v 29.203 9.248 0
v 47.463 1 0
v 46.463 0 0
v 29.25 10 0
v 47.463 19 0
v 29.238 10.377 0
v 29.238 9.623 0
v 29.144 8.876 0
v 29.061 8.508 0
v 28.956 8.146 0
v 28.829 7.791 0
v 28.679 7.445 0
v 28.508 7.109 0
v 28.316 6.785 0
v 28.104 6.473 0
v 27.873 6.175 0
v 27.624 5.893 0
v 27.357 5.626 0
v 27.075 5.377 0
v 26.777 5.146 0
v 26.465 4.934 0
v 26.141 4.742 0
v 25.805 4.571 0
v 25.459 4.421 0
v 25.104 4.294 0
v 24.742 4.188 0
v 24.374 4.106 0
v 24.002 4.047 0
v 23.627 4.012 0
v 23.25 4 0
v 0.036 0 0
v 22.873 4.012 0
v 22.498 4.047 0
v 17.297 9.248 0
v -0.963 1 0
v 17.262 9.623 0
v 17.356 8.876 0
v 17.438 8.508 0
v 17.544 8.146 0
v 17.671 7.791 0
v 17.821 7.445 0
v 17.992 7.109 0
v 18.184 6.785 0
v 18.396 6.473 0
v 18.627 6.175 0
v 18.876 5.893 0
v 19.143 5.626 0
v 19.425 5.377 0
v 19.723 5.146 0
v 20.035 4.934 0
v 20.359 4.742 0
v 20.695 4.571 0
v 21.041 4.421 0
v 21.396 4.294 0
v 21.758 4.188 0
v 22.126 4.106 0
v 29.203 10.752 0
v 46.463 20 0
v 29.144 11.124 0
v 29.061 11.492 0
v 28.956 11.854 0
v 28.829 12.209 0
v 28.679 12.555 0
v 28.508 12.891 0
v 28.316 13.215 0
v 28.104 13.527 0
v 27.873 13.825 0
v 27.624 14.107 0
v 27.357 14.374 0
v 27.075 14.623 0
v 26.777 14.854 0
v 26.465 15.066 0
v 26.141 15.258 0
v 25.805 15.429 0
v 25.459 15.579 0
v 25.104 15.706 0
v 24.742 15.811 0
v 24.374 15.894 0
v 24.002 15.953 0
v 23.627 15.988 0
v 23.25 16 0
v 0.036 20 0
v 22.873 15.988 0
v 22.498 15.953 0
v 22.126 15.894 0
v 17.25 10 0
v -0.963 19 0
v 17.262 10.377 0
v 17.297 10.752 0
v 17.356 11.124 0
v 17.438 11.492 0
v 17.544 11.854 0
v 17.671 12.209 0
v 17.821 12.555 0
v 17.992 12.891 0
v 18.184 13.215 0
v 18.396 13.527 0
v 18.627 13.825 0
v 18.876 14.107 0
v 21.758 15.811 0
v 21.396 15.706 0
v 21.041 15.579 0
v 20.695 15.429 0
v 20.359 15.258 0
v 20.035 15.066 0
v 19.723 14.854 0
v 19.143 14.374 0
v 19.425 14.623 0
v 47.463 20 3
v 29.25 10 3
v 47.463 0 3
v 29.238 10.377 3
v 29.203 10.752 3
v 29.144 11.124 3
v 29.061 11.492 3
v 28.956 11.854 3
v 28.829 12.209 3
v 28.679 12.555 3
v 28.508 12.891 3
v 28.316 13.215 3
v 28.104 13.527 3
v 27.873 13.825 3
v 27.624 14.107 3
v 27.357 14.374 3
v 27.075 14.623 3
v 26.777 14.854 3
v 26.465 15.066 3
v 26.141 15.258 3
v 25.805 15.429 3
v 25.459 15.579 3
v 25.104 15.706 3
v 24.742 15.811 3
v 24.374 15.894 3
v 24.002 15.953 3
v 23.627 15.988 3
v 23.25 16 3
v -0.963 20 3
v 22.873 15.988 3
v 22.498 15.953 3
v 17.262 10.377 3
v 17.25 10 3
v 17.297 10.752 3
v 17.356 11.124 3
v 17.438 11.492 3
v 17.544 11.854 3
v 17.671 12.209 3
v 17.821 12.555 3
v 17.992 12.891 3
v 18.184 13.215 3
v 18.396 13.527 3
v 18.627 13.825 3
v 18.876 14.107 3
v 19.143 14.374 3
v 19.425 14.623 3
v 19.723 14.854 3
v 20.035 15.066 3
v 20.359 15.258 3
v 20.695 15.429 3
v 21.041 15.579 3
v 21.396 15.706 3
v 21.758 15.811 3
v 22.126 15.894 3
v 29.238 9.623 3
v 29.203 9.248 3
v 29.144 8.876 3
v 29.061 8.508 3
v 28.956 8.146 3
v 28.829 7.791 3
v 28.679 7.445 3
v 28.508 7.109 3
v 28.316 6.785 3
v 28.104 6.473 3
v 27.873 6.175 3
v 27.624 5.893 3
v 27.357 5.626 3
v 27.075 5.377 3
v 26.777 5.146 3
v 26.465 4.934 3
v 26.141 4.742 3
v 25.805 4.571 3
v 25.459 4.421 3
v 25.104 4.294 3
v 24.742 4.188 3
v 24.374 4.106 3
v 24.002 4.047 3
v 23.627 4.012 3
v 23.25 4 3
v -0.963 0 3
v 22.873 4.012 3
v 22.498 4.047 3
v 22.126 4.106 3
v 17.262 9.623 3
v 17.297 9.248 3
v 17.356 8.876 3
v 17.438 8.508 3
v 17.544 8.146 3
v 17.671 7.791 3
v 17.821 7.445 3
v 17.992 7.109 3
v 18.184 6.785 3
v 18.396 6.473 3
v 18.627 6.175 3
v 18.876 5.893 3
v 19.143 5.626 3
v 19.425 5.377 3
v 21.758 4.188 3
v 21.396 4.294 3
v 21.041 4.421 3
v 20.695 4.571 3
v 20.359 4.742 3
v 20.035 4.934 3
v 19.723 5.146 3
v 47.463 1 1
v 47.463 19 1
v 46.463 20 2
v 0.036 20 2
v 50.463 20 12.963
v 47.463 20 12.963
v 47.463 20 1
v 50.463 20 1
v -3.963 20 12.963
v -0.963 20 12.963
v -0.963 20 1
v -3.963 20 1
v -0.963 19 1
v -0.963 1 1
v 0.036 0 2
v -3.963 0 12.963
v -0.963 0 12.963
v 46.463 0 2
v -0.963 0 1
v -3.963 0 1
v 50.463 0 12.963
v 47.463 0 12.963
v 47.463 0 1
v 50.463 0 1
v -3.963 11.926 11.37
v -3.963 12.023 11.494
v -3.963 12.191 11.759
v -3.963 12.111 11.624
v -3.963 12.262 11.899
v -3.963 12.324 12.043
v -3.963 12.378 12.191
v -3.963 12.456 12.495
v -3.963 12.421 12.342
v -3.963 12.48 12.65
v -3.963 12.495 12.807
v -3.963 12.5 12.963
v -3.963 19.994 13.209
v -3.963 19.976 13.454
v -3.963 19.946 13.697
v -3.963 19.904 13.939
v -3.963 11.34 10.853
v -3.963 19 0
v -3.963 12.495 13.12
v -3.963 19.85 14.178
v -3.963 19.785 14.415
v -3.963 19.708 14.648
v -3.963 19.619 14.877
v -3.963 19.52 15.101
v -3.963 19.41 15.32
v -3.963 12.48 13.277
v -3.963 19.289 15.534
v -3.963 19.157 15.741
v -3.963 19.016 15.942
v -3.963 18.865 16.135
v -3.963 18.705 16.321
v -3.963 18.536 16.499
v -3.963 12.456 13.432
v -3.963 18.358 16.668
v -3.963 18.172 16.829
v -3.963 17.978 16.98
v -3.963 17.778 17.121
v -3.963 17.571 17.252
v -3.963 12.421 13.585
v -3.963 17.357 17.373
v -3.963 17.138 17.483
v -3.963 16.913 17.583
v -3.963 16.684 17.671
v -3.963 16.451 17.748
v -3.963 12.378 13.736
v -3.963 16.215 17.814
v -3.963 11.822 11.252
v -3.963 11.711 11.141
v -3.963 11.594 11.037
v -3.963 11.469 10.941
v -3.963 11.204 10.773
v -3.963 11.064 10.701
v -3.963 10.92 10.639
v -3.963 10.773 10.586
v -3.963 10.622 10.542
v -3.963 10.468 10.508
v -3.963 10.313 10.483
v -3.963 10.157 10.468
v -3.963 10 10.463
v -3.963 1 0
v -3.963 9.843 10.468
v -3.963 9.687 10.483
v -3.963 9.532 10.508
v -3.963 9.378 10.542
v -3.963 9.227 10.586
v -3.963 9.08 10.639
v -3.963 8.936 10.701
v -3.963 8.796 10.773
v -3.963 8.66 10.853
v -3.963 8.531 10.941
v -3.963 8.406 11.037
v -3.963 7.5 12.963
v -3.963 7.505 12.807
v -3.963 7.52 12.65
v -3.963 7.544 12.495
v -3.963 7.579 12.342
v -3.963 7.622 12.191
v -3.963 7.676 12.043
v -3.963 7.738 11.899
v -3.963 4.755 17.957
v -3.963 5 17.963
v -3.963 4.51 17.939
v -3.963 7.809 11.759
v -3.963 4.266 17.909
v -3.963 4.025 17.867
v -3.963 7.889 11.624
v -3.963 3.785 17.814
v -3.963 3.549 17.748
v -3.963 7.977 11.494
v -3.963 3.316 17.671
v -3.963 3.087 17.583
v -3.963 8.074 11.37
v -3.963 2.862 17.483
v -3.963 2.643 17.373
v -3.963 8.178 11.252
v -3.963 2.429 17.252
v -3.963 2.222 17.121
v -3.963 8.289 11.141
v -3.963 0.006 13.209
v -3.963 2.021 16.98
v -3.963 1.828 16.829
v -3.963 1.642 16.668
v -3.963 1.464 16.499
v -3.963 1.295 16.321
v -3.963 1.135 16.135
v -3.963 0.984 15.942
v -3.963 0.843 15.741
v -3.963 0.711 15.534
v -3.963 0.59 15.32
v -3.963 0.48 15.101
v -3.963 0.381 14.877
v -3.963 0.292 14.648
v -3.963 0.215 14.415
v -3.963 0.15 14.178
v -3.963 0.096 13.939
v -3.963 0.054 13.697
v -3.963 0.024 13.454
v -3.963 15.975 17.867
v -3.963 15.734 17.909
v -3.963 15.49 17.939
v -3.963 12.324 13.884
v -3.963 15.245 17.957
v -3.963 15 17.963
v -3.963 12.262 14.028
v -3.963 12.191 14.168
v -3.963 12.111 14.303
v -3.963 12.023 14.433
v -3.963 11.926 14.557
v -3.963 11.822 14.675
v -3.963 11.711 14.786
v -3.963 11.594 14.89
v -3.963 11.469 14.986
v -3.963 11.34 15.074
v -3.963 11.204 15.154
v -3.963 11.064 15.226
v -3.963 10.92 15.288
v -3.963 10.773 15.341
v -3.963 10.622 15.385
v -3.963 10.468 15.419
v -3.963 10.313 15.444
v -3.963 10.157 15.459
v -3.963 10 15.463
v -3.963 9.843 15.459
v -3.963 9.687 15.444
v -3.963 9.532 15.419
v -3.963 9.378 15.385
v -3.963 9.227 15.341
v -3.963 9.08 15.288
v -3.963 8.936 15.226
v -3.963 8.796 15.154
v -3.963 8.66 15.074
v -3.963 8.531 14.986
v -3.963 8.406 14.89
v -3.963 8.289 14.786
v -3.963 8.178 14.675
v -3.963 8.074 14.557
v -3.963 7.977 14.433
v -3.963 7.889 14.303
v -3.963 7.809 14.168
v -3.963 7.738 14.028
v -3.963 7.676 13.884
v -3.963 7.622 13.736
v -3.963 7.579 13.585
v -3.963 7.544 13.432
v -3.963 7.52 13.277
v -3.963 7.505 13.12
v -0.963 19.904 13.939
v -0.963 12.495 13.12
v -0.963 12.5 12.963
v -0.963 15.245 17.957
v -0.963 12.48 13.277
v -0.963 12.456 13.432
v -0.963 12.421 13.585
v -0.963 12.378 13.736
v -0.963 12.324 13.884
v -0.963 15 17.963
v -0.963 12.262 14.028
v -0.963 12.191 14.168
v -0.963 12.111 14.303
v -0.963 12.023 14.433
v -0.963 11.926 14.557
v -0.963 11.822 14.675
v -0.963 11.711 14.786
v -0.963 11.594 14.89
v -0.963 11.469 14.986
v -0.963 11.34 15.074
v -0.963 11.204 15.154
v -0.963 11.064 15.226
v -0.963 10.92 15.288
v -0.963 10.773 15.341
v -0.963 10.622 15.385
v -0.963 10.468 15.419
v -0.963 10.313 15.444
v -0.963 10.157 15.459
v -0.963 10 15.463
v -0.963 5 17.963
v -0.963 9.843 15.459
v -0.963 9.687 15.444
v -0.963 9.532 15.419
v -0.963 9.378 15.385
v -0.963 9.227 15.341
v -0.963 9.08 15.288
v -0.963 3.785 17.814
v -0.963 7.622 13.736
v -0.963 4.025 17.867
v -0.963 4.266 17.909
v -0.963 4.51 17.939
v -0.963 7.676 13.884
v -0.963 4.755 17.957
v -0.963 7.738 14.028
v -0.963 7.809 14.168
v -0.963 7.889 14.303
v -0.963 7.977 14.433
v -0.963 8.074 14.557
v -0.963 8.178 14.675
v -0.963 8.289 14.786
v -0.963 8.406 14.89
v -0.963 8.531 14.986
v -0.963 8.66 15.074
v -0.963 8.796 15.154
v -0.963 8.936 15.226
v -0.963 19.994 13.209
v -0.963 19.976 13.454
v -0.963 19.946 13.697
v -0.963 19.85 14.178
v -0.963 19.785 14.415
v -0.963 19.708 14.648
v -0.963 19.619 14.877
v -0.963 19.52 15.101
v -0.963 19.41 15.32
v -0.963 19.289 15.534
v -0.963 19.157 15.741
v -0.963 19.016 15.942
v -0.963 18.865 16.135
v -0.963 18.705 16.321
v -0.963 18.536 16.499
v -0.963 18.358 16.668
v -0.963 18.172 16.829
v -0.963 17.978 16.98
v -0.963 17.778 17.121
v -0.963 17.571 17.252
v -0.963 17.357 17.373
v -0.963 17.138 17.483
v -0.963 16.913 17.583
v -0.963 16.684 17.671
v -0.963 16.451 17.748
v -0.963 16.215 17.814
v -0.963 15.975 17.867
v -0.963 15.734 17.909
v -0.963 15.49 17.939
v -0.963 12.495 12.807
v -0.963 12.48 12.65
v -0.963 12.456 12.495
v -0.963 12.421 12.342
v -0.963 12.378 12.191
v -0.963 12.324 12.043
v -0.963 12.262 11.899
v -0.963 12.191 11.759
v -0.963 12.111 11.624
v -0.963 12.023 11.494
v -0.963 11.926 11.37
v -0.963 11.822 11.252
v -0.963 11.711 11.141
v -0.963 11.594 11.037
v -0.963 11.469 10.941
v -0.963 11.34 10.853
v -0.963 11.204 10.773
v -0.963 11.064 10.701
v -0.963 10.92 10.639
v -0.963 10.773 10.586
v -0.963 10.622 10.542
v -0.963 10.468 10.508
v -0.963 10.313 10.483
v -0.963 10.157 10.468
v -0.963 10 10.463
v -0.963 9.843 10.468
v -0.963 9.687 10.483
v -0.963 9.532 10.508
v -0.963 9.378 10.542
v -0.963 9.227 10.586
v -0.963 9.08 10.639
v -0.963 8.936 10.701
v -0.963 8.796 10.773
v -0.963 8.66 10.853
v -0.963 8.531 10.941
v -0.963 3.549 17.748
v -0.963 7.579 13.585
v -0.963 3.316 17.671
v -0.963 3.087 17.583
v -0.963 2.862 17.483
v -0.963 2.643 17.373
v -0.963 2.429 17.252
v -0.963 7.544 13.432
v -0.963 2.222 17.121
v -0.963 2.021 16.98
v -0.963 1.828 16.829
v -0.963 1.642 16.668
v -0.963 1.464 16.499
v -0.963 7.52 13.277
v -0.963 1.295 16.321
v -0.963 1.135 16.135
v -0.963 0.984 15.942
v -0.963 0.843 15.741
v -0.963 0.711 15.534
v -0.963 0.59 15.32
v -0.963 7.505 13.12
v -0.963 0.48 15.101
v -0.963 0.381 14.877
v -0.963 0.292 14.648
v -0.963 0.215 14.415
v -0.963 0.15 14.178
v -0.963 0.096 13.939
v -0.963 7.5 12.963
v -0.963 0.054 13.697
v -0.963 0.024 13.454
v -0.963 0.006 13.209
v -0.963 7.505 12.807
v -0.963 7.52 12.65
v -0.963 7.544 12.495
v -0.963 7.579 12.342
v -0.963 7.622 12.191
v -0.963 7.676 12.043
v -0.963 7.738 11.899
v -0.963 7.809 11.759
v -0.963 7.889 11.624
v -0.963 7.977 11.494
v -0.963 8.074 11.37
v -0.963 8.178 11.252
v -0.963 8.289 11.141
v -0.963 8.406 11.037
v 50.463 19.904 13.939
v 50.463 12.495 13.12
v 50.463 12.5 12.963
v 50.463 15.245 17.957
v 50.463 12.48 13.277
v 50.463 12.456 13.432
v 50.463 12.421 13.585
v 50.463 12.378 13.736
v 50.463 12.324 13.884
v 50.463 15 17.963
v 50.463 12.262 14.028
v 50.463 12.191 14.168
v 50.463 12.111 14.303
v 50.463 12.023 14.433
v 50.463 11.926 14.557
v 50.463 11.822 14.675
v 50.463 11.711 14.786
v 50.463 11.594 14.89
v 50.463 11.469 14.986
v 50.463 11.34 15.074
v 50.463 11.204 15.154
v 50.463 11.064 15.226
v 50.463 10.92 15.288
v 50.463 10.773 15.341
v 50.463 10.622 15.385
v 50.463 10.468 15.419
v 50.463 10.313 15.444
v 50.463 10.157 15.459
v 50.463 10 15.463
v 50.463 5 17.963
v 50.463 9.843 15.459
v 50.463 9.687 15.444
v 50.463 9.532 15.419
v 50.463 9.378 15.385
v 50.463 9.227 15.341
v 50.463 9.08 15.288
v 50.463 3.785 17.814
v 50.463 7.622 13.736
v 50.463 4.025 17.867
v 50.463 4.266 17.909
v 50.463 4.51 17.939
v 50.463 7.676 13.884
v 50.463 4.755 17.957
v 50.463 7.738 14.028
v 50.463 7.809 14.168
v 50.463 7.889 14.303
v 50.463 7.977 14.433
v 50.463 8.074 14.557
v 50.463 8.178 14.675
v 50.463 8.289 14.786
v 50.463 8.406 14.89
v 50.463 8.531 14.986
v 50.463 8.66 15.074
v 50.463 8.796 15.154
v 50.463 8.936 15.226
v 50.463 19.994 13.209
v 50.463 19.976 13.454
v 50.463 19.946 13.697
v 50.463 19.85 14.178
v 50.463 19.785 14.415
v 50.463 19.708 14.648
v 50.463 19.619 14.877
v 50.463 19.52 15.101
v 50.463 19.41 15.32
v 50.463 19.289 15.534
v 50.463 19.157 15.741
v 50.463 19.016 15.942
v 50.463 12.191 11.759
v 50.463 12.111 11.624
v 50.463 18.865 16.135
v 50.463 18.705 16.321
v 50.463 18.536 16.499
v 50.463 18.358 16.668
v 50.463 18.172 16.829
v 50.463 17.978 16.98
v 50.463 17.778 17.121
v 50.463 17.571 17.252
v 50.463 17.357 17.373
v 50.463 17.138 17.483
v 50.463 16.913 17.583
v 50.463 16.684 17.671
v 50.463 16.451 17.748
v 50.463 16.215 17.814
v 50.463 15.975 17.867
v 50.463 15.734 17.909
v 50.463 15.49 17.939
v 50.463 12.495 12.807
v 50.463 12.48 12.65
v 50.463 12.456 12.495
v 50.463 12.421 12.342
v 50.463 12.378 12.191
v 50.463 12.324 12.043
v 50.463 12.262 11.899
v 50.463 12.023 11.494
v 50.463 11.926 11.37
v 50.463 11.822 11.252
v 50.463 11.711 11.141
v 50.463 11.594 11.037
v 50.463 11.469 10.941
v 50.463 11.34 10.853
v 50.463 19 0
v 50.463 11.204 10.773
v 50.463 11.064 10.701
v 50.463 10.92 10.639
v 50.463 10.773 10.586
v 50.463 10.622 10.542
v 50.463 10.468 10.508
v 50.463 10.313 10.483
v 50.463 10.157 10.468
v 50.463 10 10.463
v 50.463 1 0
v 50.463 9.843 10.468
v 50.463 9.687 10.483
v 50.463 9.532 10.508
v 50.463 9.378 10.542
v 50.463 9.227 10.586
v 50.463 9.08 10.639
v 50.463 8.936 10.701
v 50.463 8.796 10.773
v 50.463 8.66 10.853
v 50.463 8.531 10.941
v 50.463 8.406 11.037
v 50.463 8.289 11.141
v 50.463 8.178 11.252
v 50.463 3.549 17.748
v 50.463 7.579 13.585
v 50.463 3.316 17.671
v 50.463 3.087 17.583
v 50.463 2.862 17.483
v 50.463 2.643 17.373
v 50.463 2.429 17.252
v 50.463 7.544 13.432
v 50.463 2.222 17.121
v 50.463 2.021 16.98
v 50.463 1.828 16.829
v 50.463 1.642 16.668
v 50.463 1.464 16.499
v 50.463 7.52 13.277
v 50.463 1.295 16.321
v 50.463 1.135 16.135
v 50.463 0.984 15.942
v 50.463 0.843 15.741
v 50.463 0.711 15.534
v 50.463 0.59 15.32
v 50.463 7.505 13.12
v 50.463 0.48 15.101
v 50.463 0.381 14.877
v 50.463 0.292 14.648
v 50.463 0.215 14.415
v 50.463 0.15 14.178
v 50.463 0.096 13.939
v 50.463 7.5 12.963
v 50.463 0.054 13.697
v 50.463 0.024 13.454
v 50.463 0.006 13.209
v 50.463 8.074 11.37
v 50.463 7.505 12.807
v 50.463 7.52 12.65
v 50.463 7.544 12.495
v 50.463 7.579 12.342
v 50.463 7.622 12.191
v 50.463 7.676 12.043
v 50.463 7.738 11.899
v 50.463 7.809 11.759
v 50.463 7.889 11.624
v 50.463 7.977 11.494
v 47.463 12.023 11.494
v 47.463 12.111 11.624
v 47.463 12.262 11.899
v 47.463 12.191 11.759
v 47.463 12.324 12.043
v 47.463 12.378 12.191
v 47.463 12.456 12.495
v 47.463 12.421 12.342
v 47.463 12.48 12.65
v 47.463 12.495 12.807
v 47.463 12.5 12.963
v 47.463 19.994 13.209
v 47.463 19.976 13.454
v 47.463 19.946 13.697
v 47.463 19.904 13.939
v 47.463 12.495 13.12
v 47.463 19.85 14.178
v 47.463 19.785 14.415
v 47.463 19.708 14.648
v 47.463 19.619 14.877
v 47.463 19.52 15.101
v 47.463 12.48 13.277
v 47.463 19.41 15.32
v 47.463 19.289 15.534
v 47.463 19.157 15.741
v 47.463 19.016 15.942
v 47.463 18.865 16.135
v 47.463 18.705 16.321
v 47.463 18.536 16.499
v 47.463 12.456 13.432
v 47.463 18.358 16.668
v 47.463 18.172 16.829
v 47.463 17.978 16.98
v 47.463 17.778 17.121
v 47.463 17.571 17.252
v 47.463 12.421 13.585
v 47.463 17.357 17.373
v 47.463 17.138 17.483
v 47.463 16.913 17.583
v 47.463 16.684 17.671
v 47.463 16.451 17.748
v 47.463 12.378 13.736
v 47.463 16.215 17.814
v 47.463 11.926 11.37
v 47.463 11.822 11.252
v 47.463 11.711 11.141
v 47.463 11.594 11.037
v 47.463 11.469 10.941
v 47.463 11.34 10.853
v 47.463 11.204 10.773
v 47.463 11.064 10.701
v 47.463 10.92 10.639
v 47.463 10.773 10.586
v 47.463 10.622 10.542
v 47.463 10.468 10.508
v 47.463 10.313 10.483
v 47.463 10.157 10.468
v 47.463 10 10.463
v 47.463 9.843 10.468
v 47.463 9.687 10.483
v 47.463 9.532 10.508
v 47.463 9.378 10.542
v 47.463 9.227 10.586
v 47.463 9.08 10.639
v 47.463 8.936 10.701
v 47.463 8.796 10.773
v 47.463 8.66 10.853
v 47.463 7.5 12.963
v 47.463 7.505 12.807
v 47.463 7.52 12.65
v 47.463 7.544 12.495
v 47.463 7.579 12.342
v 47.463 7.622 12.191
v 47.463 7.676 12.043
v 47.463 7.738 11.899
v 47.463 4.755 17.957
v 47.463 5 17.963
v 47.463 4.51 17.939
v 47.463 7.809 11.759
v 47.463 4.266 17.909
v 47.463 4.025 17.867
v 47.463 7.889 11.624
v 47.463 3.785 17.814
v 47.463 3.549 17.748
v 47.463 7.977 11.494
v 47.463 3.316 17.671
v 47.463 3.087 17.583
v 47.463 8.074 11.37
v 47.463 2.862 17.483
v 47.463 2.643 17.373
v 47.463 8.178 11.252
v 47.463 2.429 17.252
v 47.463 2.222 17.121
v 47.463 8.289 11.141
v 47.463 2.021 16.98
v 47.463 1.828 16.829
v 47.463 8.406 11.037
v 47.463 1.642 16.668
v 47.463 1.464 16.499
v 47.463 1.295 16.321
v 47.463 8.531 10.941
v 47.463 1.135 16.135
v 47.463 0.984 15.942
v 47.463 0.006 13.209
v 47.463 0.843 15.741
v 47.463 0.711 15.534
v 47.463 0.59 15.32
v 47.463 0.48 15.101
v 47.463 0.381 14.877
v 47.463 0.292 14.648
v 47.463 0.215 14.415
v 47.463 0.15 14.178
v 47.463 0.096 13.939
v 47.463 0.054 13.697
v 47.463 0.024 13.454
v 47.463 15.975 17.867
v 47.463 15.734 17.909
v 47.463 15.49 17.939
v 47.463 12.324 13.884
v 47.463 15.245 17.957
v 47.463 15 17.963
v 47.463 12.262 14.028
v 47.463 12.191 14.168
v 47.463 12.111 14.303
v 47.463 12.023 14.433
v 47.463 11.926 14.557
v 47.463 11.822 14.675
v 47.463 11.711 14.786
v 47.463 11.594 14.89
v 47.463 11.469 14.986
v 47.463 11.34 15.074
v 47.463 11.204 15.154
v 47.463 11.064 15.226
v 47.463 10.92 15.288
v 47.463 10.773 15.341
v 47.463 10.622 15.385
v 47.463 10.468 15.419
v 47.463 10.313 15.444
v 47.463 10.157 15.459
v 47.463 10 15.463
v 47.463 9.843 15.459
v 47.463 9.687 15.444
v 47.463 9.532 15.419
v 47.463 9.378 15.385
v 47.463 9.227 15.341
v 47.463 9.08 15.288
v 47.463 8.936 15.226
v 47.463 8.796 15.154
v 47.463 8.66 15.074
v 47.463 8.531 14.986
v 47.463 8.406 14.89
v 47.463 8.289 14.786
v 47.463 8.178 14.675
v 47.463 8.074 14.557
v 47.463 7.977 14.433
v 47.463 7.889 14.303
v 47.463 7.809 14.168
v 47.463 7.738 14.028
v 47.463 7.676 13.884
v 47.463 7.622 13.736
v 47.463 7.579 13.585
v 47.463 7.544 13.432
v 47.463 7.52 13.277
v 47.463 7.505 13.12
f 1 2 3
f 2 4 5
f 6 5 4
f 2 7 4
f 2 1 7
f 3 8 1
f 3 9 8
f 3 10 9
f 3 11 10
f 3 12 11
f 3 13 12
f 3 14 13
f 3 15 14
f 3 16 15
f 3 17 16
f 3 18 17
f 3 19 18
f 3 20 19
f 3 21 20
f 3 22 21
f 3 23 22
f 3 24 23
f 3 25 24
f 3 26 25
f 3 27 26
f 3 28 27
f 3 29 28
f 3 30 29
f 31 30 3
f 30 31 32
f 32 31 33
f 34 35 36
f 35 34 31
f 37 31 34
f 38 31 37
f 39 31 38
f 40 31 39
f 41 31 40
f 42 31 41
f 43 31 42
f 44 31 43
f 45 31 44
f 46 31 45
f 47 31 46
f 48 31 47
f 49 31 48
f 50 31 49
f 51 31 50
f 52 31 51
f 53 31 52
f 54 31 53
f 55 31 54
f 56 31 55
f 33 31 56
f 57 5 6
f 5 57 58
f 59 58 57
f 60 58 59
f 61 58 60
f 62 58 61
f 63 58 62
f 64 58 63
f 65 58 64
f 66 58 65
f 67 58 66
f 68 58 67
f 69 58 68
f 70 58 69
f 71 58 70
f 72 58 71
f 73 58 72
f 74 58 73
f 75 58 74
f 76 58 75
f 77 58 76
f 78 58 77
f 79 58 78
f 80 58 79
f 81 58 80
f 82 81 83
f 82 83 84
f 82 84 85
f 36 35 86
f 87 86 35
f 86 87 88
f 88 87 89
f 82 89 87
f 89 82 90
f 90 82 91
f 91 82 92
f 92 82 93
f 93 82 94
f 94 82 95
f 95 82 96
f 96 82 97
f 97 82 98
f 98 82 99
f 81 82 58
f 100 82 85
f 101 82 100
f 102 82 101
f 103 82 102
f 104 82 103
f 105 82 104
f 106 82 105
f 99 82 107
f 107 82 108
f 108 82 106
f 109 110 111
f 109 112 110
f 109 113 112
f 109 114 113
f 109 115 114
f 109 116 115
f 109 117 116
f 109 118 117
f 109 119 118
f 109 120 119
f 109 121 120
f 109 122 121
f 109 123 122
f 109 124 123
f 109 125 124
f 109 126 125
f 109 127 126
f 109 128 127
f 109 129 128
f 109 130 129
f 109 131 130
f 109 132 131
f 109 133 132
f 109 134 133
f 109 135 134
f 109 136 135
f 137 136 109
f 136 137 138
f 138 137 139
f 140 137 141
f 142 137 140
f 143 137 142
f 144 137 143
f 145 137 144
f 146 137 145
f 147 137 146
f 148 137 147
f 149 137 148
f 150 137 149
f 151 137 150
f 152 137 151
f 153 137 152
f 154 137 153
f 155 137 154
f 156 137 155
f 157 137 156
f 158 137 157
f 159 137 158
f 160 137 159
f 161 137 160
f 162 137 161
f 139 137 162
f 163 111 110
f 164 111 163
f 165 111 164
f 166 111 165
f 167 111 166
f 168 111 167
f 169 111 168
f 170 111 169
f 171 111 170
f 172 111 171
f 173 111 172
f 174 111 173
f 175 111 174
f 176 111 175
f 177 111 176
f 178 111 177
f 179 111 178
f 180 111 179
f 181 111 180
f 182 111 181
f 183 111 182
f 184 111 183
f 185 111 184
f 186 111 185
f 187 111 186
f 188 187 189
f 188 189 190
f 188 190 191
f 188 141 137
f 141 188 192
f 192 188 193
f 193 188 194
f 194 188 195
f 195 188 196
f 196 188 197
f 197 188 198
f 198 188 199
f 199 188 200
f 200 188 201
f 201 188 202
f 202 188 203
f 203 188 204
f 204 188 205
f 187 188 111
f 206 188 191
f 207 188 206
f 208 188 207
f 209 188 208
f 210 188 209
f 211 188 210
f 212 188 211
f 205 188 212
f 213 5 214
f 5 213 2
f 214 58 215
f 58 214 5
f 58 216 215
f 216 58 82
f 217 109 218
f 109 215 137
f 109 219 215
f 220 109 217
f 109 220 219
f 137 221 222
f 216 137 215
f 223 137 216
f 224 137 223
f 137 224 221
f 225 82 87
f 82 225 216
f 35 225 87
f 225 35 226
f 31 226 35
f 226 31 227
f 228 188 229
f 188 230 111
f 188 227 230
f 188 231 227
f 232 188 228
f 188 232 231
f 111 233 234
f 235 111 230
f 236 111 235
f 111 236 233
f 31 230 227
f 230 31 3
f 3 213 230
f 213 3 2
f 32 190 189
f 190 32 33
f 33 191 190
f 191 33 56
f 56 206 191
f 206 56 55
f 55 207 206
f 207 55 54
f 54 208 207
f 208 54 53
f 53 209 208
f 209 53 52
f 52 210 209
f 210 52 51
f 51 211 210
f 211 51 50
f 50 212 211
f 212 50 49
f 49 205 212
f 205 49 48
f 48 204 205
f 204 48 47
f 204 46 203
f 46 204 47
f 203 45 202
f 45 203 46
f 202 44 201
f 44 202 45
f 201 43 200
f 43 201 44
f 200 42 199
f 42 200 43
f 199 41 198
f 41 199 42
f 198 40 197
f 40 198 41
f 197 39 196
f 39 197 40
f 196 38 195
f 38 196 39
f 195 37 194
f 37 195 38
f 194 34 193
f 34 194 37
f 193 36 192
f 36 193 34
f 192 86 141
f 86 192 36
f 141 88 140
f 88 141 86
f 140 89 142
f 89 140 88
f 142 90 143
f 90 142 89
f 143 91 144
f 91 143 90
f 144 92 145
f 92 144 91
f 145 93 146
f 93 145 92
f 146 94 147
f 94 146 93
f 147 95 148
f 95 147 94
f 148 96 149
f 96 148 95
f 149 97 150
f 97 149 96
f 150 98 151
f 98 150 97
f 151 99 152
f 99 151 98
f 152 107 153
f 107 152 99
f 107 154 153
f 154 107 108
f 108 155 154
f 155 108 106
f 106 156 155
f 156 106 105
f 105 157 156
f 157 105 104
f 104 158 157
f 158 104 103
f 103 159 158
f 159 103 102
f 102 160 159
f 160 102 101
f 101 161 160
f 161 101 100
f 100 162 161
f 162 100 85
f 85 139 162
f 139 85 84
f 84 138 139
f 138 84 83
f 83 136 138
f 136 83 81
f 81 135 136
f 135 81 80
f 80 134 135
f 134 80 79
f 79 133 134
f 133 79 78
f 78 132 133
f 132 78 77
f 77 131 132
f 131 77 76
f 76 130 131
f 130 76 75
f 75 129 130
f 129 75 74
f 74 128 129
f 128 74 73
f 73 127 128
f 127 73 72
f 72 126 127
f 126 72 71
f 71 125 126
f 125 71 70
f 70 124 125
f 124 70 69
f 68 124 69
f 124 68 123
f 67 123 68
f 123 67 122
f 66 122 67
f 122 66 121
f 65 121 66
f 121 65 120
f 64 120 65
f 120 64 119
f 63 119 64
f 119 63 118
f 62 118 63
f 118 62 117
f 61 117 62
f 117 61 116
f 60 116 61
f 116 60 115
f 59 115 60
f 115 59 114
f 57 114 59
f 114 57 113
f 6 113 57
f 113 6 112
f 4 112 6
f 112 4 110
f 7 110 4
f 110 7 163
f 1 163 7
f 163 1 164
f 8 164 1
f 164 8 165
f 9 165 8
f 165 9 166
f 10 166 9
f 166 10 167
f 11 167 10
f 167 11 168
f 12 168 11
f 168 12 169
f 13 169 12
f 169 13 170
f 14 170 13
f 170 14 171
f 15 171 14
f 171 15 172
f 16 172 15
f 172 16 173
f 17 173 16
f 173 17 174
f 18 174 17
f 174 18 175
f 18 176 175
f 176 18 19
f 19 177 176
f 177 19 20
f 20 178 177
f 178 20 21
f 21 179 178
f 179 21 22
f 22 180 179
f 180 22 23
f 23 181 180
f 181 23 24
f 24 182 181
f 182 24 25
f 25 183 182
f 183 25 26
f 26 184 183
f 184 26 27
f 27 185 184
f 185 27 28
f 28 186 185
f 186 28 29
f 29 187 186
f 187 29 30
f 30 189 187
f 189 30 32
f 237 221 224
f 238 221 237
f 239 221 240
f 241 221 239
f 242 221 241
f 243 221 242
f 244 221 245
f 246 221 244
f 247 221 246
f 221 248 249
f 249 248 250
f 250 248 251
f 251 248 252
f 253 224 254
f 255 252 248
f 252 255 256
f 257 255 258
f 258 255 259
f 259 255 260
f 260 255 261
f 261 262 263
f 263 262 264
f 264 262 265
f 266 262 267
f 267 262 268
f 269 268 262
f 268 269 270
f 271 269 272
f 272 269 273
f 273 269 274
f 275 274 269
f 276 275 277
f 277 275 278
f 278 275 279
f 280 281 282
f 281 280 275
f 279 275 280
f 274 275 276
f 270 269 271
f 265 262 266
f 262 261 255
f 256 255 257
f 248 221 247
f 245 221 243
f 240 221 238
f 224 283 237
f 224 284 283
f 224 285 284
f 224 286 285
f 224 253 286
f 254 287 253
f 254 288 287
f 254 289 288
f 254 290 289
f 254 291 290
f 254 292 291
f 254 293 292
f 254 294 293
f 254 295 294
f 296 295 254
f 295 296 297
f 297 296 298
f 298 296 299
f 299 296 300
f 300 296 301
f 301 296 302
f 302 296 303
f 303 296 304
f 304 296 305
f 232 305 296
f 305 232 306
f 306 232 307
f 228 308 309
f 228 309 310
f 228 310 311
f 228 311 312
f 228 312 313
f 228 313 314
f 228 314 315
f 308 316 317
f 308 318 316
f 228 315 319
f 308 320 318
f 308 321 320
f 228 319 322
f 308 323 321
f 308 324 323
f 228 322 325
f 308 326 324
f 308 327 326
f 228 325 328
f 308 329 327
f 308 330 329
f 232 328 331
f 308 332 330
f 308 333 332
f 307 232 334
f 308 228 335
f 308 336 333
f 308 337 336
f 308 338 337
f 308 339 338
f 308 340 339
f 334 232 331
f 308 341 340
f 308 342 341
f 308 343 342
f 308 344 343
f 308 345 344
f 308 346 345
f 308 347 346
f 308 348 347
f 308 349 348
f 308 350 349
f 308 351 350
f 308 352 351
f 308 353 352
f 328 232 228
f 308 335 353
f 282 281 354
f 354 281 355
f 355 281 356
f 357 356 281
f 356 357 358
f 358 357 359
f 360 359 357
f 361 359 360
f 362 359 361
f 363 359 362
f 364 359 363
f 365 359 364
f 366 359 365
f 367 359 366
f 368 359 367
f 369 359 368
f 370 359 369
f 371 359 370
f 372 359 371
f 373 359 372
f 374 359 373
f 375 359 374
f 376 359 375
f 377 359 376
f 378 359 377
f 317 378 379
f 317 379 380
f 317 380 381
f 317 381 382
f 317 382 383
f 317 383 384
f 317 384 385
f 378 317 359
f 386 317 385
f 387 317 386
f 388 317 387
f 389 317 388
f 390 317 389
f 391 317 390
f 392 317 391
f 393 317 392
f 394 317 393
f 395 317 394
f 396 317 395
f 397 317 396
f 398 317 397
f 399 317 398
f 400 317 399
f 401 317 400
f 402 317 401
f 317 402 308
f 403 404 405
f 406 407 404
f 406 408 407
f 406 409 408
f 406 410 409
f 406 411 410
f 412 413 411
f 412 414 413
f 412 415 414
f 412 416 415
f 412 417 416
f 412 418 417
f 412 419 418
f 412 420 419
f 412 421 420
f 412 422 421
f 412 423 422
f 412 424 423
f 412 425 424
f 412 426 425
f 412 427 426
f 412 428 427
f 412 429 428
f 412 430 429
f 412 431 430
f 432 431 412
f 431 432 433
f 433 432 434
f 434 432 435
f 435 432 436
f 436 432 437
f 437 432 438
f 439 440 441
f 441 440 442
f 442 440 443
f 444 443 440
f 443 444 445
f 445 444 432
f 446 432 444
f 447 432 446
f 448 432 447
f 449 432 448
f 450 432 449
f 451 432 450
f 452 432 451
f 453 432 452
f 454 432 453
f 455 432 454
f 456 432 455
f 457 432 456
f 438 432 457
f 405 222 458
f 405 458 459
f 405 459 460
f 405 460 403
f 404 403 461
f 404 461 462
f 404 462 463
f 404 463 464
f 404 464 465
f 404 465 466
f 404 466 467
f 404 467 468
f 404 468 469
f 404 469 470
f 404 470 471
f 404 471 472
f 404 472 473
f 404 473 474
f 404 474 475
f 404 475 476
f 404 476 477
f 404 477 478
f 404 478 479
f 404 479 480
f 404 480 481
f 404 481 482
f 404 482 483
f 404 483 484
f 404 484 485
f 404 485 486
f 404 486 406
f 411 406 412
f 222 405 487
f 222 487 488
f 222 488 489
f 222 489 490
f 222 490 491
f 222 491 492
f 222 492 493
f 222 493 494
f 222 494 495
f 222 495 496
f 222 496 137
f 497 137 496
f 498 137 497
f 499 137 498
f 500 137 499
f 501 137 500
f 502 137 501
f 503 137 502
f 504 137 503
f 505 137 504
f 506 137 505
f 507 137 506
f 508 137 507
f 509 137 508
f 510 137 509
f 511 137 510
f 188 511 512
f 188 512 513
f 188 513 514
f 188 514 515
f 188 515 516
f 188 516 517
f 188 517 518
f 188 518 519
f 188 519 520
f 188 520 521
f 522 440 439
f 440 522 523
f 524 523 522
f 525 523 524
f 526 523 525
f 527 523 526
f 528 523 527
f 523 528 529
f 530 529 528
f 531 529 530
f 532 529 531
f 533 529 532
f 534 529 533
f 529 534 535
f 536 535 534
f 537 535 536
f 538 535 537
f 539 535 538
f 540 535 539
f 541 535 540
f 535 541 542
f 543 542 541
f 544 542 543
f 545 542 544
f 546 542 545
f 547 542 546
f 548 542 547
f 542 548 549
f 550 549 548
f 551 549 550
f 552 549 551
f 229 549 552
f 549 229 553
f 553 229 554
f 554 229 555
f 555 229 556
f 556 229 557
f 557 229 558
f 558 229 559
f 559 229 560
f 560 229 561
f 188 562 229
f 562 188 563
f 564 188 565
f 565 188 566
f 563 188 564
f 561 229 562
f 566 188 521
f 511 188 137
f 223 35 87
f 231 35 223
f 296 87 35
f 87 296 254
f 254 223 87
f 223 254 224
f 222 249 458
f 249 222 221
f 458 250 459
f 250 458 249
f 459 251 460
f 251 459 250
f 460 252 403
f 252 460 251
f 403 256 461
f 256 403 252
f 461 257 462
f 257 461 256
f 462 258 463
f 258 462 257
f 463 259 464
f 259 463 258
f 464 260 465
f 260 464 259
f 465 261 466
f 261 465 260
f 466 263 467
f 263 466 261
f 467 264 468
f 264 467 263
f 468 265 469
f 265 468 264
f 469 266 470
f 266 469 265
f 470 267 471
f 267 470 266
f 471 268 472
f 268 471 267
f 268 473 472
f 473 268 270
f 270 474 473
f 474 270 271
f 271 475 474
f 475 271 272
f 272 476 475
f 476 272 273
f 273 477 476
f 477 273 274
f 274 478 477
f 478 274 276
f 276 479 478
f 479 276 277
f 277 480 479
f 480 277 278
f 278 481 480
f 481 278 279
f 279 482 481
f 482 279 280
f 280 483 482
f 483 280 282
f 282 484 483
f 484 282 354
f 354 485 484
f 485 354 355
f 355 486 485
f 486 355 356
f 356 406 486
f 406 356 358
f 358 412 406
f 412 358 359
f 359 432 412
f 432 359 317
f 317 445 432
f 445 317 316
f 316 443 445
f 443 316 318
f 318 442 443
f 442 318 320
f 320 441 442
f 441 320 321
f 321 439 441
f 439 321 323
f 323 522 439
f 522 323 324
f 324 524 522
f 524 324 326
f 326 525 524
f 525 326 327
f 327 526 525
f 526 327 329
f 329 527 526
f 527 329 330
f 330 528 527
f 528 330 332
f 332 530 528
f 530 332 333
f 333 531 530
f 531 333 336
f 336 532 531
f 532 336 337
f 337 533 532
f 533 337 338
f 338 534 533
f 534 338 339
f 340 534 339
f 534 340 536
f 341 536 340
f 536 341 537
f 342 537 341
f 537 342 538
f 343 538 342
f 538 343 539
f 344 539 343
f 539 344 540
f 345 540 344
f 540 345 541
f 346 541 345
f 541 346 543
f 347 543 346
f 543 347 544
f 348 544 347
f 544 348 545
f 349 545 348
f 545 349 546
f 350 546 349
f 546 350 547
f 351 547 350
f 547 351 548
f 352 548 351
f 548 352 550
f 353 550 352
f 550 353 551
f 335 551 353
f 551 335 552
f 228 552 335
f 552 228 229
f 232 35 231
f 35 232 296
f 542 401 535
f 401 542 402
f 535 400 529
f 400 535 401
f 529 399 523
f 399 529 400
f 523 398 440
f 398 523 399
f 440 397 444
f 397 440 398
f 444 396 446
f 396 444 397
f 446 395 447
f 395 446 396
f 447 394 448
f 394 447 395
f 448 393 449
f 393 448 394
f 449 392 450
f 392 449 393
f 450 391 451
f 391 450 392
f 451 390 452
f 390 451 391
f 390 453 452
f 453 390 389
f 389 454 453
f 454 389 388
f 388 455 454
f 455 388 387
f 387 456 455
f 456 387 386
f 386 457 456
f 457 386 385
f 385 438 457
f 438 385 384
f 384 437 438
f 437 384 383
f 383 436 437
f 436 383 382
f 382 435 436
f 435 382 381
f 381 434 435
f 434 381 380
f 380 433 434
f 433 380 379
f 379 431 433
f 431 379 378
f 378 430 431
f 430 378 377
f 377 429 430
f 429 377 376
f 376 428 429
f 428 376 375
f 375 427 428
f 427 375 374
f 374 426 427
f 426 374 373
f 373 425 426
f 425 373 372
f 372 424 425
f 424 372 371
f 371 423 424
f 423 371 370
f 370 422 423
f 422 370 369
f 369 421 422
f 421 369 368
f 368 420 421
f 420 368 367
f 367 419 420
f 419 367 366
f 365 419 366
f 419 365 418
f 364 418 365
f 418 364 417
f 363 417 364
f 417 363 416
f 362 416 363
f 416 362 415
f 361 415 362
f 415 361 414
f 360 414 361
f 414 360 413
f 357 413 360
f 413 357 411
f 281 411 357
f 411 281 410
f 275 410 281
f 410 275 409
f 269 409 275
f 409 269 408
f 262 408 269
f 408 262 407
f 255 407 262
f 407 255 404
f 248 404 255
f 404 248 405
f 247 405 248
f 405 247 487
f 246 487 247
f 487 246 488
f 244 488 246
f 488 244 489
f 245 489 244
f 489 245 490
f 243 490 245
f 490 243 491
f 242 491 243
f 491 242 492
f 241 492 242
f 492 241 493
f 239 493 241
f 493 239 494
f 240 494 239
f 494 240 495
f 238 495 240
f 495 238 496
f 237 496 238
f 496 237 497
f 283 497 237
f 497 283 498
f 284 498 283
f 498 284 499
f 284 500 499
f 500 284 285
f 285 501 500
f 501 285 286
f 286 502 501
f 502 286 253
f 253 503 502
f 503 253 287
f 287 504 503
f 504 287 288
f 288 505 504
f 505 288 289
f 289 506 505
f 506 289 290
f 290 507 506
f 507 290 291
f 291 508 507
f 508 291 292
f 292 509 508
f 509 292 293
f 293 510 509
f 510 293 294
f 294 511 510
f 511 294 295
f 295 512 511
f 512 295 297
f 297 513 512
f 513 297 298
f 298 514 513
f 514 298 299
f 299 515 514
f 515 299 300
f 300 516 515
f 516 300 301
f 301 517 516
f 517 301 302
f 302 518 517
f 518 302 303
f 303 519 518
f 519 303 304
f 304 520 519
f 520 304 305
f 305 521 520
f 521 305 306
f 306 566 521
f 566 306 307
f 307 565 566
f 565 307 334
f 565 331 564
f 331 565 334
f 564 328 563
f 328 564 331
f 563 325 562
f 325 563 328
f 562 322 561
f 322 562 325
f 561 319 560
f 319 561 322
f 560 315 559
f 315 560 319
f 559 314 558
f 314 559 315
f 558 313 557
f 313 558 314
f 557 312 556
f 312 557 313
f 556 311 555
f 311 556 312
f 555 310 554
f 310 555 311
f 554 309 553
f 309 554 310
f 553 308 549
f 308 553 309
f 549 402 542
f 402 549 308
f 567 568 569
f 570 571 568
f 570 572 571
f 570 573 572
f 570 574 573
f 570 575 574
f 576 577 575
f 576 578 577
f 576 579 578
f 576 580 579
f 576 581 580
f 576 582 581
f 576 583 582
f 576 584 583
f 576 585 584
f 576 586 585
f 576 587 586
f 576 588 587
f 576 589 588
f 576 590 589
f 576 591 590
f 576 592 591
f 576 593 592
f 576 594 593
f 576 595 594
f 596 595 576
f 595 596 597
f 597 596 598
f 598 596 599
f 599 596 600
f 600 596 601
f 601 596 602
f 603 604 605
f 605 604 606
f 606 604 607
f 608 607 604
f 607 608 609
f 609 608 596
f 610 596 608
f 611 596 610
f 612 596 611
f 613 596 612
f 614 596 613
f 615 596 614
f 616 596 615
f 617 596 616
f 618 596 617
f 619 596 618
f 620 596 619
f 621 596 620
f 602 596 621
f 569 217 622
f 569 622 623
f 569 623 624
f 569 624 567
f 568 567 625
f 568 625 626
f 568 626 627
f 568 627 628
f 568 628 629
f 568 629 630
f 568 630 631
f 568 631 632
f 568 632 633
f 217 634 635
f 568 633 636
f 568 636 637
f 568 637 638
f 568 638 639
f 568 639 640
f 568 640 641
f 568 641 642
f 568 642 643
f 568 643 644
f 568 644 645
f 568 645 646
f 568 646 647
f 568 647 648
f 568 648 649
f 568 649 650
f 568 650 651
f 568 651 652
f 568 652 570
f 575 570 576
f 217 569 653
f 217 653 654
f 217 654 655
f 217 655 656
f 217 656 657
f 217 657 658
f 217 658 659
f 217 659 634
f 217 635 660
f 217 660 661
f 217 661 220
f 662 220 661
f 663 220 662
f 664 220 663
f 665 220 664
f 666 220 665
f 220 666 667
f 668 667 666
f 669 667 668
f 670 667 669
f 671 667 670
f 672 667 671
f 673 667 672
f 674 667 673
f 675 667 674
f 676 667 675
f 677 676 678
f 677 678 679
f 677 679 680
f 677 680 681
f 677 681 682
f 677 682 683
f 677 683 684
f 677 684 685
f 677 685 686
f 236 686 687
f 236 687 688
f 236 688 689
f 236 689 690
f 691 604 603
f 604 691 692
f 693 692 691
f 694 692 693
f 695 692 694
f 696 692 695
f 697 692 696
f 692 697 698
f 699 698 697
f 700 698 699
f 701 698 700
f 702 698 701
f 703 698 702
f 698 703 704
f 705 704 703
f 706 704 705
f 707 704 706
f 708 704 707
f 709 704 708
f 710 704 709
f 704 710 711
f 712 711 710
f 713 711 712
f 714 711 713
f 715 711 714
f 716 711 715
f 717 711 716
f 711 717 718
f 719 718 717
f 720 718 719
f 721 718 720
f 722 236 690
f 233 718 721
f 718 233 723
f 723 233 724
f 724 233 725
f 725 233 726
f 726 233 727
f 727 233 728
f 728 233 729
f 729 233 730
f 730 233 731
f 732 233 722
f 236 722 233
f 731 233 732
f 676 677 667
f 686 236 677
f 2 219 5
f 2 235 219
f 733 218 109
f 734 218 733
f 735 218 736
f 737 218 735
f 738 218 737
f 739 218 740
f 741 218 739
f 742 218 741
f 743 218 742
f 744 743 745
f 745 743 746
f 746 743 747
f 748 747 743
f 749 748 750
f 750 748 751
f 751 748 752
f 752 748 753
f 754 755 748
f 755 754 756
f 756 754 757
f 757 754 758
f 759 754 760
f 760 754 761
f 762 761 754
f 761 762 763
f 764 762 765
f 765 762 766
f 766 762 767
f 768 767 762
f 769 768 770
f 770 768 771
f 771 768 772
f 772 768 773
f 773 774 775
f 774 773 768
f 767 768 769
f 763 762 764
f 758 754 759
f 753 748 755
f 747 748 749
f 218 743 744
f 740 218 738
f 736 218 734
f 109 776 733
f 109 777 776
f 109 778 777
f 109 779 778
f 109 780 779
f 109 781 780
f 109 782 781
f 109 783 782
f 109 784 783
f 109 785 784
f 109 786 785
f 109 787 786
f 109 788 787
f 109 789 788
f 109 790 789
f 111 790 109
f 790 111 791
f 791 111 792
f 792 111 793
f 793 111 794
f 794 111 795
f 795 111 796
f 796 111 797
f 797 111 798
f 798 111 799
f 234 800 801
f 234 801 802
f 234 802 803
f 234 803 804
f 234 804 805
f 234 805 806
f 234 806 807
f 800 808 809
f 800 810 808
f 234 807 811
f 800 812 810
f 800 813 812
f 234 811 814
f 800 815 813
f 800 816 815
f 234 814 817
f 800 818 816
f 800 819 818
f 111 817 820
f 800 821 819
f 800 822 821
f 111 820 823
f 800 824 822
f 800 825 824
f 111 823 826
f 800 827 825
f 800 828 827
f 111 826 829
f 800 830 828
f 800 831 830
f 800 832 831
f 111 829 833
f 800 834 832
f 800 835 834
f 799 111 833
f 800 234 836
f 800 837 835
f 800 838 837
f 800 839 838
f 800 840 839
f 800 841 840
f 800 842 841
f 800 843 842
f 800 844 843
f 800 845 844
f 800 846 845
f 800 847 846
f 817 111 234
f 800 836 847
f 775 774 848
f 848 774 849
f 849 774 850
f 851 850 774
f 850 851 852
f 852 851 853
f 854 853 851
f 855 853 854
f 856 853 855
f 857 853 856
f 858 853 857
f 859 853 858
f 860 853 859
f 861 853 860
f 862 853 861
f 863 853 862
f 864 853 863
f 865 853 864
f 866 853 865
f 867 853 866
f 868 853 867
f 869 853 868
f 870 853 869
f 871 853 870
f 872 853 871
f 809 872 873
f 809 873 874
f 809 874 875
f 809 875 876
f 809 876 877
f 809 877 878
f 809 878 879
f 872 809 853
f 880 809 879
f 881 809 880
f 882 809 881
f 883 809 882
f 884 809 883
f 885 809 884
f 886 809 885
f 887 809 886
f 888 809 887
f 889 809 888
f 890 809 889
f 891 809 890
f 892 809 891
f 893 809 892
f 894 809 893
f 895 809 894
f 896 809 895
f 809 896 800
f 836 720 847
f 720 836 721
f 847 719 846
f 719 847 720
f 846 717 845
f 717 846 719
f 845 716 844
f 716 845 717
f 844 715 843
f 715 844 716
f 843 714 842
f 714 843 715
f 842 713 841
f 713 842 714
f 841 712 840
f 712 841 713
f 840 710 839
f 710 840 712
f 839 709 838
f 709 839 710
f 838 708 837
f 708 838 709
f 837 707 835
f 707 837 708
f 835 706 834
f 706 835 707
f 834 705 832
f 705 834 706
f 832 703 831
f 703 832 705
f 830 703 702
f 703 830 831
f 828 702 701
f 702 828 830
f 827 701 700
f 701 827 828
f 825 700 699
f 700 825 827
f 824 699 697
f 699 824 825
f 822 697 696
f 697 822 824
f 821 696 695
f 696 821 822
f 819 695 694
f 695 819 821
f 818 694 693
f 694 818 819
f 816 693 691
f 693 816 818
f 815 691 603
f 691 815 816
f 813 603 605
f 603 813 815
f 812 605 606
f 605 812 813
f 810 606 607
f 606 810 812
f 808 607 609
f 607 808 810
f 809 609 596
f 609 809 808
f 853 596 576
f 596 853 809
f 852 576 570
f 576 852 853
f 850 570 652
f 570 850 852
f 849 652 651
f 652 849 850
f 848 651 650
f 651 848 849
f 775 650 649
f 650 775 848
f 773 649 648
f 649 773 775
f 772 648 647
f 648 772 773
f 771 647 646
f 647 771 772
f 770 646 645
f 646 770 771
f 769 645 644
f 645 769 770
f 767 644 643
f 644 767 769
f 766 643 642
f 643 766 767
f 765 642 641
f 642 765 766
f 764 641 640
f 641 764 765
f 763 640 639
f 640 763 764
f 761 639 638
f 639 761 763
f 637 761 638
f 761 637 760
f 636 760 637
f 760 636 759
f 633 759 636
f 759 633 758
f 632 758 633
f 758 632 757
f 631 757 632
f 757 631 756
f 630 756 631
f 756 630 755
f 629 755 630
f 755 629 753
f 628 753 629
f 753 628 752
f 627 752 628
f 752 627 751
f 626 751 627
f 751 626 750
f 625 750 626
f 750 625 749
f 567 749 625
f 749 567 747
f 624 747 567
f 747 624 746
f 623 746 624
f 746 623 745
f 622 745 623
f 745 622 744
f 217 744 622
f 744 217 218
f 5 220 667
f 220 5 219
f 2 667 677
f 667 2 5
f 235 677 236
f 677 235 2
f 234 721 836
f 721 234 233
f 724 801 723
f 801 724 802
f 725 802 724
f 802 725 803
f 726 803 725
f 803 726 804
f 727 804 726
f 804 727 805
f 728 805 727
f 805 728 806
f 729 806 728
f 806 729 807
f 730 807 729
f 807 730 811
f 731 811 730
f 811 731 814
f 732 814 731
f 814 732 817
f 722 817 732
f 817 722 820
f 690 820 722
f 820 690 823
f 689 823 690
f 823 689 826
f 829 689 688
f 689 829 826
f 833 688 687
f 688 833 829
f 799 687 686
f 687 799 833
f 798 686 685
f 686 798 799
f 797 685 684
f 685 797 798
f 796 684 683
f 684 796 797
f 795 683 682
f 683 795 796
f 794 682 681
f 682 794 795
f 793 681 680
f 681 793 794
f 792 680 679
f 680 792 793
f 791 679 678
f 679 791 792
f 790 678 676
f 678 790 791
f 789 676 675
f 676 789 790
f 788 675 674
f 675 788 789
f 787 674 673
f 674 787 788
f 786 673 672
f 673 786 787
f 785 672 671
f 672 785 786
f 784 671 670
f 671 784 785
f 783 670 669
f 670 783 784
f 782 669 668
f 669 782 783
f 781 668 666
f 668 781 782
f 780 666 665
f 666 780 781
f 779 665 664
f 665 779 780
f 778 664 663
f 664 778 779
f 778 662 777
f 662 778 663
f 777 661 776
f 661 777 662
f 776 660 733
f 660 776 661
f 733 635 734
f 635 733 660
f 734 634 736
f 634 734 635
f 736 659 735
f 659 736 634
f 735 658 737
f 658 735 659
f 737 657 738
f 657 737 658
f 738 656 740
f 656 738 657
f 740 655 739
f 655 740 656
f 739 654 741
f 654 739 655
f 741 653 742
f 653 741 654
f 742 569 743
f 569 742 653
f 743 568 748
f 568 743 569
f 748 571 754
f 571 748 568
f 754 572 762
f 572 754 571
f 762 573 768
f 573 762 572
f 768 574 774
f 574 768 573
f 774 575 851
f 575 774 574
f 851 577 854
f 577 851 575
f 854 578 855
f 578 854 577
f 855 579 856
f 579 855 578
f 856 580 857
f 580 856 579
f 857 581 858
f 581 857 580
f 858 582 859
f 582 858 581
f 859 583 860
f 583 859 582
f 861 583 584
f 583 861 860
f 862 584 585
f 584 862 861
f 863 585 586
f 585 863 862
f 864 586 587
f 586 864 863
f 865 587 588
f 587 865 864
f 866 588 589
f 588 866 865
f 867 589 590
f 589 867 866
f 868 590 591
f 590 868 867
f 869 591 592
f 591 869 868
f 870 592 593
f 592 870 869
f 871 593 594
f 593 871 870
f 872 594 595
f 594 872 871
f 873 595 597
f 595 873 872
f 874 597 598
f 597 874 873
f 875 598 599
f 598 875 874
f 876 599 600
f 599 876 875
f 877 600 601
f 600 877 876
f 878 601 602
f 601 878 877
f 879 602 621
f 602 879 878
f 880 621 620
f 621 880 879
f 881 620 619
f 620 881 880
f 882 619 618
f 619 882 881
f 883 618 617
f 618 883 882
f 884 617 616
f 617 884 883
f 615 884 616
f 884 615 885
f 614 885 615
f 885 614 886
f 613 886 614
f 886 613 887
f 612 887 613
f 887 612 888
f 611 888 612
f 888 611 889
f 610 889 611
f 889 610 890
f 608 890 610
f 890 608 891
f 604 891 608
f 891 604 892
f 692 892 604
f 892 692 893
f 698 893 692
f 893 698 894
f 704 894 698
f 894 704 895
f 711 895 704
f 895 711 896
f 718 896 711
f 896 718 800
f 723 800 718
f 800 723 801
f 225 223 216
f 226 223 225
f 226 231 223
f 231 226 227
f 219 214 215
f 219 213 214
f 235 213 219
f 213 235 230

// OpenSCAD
// 3mm Brake Spring Back Plate
// Extracted and reconstructed from DXF
// Modified for native 3D printing by applying 90-degree folds and inner corner fillets.

$fn = 100;

// Reconstruct the 2D outer perimeter with all lines, V-notches, and arcs
module outer_profile() {
    cx1 = -13.926990817; 
    cx2 = 60.426990817;  
    cy_bot = 5.0;        
    cy_top = 15.0;       
    rad = 5.0;           
    n_arc = 32; 
    
    points = concat(
        [ for (i = [0 : n_arc]) [cx1 + rad * cos(90 + i * 90 / n_arc), cy_top + rad * sin(90 + i * 90 / n_arc)] ],
        [ for (i = [0 : n_arc]) [cx1 + rad * cos(180 + i * 90 / n_arc), cy_bot + rad * sin(180 + i * 90 / n_arc)] ],
        [
            [-1.9634954085, 0.0],
            [-0.9634954085, 1.0],
            [0.0365045915, 0.0],
            [46.4634954085, 0.0],
            [47.4634954085, 1.0],
            [48.4634954085, 0.0]
        ],
        [ for (i = [0 : n_arc]) [cx2 + rad * cos(270 + i * 90 / n_arc), cy_bot + rad * sin(270 + i * 90 / n_arc)] ],
        [ for (i = [0 : n_arc]) [cx2 + rad * cos(0 + i * 90 / n_arc), cy_top + rad * sin(0 + i * 90 / n_arc)] ],
        [
            [48.4634954085, 20.0],
            [47.4634954085, 19.0],
            [46.4634954085, 20.0],
            [0.0365045915, 20.0],
            [-0.9634954085, 19.0],
            [-1.9634954085, 20.0]
        ]
    );
    polygon(points);
}

module internal_holes() {
    translate([-13.926990817, 10.0]) circle(r = 2.5);
    translate([60.426990817, 10.0]) circle(r = 2.5);
    translate([23.25, 10.0]) circle(r = 6.0);
}

module brake_spring_back_plate_2d() {
    difference() {
        outer_profile();
        internal_holes();
    }
}

// Generate the folded 3D part
module brake_spring_back_plate(thickness = 3.0) {
    x_left = -0.9634954085;
    x_right = 47.4634954085;
    
    // Center Piece
    linear_extrude(height = thickness, convexity = 4)
        intersection() {
            brake_spring_back_plate_2d();
            translate([x_left, -100]) square([x_right - x_left, 200]);
        }
        
    // Left Tab
    translate([x_left - thickness, 0, 0])
        rotate([0, 90, 0])
            translate([-x_left, 0, 0])
                linear_extrude(height = thickness, convexity = 4)
                    intersection() {
                        brake_spring_back_plate_2d();
                        translate([-200, -100]) square([200 + x_left, 200]);
                    }
                    
    // Right Tab
    translate([x_right + thickness, 0, 0])
        rotate([0, -90, 0])
            translate([-x_right, 0, 0])
                linear_extrude(height = thickness, convexity = 4)
                    intersection() {
                        brake_spring_back_plate_2d();
                        translate([x_right, -100]) square([200, 200]);
                    }
                    
    // Inner Fillets
    translate([x_left, 0, thickness])
        rotate([-90, 0, 0])
            linear_extrude(height = 20)
                polygon([[0,0], [2,0], [0,2]]);
                
    translate([x_right, 0, thickness])
        rotate([-90, 0, 0])
            linear_extrude(height = 20)
                polygon([[0,0], [-2,0], [0,2]]);
}

brake_spring_back_plate(thickness = 3.0);
